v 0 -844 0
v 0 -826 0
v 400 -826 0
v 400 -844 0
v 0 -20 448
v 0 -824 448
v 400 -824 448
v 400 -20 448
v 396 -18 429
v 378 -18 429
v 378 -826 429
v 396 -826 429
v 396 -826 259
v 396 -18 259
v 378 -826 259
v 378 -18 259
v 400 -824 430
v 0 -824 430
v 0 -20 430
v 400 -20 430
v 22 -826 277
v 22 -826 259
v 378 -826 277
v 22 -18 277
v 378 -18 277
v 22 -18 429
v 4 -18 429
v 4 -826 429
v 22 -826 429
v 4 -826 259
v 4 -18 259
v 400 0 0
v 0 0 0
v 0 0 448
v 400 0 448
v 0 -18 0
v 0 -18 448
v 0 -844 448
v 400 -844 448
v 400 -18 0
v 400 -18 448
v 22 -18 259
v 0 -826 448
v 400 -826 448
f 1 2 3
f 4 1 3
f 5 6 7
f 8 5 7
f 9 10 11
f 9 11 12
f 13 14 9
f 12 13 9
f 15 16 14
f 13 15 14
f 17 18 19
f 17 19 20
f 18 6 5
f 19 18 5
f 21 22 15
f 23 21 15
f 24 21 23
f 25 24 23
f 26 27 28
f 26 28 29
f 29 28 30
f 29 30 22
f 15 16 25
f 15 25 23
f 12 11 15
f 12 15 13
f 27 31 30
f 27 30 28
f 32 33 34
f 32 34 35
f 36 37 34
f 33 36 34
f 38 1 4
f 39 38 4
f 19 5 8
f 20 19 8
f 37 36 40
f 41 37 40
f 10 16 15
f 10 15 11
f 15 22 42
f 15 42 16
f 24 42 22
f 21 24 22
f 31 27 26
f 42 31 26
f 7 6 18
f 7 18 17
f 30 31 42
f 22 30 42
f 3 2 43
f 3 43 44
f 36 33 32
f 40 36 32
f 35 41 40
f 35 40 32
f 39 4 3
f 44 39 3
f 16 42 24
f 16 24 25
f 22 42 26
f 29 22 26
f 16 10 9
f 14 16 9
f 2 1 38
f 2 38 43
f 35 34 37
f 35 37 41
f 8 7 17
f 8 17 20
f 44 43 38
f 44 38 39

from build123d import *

# Parameters (mm, degrees)
F0_W     = 400
F0_H     = 18
F1_DEPTH = 448
F2_W     = 18
F2_H     = 170
F3_DEPTH = 808
F4_W     = 356
F4_H     = 808
F5_DEPTH = 18
F6_W     = 400
F6_H     = 804
F7_DEPTH = 18


with BuildPart() as f1:
    # F0 (on Top) → F1 (new body)
    with BuildSketch(Plane.XY):
        with Locations((200, -9)):
            Rectangle(F0_W, F0_H)
        with Locations((200, -835)):
            Rectangle(F0_W, F0_H)
    extrude(amount=F1_DEPTH)


with BuildPart() as f3:
    # F2 (on face) → F3 (new body, through all)
    with BuildSketch(Plane.XZ.offset(18)):
        with Locations((13, 344)):
            Rectangle(F2_W, F2_H)
        with Locations((387, 344)):
            Rectangle(F2_W, F2_H)
    extrude(amount=F3_DEPTH)


with BuildPart() as f5:
    # F4 (on face) → F5 (new body)
    with BuildSketch(Plane(origin=(0, 0, 259), x_dir=(1, 0, 0), z_dir=(0, 0, -1))):
        with Locations((200, 422)):
            Rectangle(F4_W, F4_H)
    extrude(amount=-F5_DEPTH)


with BuildPart() as f7:
    # F6 (on face) → F7 (new body)
    with BuildSketch(Plane.XY.offset(448)):
        with Locations((200, -422)):
            Rectangle(F6_W, F6_H)
    extrude(amount=-F7_DEPTH)


solid = Compound([f1.part, f3.part, f5.part, f7.part])
